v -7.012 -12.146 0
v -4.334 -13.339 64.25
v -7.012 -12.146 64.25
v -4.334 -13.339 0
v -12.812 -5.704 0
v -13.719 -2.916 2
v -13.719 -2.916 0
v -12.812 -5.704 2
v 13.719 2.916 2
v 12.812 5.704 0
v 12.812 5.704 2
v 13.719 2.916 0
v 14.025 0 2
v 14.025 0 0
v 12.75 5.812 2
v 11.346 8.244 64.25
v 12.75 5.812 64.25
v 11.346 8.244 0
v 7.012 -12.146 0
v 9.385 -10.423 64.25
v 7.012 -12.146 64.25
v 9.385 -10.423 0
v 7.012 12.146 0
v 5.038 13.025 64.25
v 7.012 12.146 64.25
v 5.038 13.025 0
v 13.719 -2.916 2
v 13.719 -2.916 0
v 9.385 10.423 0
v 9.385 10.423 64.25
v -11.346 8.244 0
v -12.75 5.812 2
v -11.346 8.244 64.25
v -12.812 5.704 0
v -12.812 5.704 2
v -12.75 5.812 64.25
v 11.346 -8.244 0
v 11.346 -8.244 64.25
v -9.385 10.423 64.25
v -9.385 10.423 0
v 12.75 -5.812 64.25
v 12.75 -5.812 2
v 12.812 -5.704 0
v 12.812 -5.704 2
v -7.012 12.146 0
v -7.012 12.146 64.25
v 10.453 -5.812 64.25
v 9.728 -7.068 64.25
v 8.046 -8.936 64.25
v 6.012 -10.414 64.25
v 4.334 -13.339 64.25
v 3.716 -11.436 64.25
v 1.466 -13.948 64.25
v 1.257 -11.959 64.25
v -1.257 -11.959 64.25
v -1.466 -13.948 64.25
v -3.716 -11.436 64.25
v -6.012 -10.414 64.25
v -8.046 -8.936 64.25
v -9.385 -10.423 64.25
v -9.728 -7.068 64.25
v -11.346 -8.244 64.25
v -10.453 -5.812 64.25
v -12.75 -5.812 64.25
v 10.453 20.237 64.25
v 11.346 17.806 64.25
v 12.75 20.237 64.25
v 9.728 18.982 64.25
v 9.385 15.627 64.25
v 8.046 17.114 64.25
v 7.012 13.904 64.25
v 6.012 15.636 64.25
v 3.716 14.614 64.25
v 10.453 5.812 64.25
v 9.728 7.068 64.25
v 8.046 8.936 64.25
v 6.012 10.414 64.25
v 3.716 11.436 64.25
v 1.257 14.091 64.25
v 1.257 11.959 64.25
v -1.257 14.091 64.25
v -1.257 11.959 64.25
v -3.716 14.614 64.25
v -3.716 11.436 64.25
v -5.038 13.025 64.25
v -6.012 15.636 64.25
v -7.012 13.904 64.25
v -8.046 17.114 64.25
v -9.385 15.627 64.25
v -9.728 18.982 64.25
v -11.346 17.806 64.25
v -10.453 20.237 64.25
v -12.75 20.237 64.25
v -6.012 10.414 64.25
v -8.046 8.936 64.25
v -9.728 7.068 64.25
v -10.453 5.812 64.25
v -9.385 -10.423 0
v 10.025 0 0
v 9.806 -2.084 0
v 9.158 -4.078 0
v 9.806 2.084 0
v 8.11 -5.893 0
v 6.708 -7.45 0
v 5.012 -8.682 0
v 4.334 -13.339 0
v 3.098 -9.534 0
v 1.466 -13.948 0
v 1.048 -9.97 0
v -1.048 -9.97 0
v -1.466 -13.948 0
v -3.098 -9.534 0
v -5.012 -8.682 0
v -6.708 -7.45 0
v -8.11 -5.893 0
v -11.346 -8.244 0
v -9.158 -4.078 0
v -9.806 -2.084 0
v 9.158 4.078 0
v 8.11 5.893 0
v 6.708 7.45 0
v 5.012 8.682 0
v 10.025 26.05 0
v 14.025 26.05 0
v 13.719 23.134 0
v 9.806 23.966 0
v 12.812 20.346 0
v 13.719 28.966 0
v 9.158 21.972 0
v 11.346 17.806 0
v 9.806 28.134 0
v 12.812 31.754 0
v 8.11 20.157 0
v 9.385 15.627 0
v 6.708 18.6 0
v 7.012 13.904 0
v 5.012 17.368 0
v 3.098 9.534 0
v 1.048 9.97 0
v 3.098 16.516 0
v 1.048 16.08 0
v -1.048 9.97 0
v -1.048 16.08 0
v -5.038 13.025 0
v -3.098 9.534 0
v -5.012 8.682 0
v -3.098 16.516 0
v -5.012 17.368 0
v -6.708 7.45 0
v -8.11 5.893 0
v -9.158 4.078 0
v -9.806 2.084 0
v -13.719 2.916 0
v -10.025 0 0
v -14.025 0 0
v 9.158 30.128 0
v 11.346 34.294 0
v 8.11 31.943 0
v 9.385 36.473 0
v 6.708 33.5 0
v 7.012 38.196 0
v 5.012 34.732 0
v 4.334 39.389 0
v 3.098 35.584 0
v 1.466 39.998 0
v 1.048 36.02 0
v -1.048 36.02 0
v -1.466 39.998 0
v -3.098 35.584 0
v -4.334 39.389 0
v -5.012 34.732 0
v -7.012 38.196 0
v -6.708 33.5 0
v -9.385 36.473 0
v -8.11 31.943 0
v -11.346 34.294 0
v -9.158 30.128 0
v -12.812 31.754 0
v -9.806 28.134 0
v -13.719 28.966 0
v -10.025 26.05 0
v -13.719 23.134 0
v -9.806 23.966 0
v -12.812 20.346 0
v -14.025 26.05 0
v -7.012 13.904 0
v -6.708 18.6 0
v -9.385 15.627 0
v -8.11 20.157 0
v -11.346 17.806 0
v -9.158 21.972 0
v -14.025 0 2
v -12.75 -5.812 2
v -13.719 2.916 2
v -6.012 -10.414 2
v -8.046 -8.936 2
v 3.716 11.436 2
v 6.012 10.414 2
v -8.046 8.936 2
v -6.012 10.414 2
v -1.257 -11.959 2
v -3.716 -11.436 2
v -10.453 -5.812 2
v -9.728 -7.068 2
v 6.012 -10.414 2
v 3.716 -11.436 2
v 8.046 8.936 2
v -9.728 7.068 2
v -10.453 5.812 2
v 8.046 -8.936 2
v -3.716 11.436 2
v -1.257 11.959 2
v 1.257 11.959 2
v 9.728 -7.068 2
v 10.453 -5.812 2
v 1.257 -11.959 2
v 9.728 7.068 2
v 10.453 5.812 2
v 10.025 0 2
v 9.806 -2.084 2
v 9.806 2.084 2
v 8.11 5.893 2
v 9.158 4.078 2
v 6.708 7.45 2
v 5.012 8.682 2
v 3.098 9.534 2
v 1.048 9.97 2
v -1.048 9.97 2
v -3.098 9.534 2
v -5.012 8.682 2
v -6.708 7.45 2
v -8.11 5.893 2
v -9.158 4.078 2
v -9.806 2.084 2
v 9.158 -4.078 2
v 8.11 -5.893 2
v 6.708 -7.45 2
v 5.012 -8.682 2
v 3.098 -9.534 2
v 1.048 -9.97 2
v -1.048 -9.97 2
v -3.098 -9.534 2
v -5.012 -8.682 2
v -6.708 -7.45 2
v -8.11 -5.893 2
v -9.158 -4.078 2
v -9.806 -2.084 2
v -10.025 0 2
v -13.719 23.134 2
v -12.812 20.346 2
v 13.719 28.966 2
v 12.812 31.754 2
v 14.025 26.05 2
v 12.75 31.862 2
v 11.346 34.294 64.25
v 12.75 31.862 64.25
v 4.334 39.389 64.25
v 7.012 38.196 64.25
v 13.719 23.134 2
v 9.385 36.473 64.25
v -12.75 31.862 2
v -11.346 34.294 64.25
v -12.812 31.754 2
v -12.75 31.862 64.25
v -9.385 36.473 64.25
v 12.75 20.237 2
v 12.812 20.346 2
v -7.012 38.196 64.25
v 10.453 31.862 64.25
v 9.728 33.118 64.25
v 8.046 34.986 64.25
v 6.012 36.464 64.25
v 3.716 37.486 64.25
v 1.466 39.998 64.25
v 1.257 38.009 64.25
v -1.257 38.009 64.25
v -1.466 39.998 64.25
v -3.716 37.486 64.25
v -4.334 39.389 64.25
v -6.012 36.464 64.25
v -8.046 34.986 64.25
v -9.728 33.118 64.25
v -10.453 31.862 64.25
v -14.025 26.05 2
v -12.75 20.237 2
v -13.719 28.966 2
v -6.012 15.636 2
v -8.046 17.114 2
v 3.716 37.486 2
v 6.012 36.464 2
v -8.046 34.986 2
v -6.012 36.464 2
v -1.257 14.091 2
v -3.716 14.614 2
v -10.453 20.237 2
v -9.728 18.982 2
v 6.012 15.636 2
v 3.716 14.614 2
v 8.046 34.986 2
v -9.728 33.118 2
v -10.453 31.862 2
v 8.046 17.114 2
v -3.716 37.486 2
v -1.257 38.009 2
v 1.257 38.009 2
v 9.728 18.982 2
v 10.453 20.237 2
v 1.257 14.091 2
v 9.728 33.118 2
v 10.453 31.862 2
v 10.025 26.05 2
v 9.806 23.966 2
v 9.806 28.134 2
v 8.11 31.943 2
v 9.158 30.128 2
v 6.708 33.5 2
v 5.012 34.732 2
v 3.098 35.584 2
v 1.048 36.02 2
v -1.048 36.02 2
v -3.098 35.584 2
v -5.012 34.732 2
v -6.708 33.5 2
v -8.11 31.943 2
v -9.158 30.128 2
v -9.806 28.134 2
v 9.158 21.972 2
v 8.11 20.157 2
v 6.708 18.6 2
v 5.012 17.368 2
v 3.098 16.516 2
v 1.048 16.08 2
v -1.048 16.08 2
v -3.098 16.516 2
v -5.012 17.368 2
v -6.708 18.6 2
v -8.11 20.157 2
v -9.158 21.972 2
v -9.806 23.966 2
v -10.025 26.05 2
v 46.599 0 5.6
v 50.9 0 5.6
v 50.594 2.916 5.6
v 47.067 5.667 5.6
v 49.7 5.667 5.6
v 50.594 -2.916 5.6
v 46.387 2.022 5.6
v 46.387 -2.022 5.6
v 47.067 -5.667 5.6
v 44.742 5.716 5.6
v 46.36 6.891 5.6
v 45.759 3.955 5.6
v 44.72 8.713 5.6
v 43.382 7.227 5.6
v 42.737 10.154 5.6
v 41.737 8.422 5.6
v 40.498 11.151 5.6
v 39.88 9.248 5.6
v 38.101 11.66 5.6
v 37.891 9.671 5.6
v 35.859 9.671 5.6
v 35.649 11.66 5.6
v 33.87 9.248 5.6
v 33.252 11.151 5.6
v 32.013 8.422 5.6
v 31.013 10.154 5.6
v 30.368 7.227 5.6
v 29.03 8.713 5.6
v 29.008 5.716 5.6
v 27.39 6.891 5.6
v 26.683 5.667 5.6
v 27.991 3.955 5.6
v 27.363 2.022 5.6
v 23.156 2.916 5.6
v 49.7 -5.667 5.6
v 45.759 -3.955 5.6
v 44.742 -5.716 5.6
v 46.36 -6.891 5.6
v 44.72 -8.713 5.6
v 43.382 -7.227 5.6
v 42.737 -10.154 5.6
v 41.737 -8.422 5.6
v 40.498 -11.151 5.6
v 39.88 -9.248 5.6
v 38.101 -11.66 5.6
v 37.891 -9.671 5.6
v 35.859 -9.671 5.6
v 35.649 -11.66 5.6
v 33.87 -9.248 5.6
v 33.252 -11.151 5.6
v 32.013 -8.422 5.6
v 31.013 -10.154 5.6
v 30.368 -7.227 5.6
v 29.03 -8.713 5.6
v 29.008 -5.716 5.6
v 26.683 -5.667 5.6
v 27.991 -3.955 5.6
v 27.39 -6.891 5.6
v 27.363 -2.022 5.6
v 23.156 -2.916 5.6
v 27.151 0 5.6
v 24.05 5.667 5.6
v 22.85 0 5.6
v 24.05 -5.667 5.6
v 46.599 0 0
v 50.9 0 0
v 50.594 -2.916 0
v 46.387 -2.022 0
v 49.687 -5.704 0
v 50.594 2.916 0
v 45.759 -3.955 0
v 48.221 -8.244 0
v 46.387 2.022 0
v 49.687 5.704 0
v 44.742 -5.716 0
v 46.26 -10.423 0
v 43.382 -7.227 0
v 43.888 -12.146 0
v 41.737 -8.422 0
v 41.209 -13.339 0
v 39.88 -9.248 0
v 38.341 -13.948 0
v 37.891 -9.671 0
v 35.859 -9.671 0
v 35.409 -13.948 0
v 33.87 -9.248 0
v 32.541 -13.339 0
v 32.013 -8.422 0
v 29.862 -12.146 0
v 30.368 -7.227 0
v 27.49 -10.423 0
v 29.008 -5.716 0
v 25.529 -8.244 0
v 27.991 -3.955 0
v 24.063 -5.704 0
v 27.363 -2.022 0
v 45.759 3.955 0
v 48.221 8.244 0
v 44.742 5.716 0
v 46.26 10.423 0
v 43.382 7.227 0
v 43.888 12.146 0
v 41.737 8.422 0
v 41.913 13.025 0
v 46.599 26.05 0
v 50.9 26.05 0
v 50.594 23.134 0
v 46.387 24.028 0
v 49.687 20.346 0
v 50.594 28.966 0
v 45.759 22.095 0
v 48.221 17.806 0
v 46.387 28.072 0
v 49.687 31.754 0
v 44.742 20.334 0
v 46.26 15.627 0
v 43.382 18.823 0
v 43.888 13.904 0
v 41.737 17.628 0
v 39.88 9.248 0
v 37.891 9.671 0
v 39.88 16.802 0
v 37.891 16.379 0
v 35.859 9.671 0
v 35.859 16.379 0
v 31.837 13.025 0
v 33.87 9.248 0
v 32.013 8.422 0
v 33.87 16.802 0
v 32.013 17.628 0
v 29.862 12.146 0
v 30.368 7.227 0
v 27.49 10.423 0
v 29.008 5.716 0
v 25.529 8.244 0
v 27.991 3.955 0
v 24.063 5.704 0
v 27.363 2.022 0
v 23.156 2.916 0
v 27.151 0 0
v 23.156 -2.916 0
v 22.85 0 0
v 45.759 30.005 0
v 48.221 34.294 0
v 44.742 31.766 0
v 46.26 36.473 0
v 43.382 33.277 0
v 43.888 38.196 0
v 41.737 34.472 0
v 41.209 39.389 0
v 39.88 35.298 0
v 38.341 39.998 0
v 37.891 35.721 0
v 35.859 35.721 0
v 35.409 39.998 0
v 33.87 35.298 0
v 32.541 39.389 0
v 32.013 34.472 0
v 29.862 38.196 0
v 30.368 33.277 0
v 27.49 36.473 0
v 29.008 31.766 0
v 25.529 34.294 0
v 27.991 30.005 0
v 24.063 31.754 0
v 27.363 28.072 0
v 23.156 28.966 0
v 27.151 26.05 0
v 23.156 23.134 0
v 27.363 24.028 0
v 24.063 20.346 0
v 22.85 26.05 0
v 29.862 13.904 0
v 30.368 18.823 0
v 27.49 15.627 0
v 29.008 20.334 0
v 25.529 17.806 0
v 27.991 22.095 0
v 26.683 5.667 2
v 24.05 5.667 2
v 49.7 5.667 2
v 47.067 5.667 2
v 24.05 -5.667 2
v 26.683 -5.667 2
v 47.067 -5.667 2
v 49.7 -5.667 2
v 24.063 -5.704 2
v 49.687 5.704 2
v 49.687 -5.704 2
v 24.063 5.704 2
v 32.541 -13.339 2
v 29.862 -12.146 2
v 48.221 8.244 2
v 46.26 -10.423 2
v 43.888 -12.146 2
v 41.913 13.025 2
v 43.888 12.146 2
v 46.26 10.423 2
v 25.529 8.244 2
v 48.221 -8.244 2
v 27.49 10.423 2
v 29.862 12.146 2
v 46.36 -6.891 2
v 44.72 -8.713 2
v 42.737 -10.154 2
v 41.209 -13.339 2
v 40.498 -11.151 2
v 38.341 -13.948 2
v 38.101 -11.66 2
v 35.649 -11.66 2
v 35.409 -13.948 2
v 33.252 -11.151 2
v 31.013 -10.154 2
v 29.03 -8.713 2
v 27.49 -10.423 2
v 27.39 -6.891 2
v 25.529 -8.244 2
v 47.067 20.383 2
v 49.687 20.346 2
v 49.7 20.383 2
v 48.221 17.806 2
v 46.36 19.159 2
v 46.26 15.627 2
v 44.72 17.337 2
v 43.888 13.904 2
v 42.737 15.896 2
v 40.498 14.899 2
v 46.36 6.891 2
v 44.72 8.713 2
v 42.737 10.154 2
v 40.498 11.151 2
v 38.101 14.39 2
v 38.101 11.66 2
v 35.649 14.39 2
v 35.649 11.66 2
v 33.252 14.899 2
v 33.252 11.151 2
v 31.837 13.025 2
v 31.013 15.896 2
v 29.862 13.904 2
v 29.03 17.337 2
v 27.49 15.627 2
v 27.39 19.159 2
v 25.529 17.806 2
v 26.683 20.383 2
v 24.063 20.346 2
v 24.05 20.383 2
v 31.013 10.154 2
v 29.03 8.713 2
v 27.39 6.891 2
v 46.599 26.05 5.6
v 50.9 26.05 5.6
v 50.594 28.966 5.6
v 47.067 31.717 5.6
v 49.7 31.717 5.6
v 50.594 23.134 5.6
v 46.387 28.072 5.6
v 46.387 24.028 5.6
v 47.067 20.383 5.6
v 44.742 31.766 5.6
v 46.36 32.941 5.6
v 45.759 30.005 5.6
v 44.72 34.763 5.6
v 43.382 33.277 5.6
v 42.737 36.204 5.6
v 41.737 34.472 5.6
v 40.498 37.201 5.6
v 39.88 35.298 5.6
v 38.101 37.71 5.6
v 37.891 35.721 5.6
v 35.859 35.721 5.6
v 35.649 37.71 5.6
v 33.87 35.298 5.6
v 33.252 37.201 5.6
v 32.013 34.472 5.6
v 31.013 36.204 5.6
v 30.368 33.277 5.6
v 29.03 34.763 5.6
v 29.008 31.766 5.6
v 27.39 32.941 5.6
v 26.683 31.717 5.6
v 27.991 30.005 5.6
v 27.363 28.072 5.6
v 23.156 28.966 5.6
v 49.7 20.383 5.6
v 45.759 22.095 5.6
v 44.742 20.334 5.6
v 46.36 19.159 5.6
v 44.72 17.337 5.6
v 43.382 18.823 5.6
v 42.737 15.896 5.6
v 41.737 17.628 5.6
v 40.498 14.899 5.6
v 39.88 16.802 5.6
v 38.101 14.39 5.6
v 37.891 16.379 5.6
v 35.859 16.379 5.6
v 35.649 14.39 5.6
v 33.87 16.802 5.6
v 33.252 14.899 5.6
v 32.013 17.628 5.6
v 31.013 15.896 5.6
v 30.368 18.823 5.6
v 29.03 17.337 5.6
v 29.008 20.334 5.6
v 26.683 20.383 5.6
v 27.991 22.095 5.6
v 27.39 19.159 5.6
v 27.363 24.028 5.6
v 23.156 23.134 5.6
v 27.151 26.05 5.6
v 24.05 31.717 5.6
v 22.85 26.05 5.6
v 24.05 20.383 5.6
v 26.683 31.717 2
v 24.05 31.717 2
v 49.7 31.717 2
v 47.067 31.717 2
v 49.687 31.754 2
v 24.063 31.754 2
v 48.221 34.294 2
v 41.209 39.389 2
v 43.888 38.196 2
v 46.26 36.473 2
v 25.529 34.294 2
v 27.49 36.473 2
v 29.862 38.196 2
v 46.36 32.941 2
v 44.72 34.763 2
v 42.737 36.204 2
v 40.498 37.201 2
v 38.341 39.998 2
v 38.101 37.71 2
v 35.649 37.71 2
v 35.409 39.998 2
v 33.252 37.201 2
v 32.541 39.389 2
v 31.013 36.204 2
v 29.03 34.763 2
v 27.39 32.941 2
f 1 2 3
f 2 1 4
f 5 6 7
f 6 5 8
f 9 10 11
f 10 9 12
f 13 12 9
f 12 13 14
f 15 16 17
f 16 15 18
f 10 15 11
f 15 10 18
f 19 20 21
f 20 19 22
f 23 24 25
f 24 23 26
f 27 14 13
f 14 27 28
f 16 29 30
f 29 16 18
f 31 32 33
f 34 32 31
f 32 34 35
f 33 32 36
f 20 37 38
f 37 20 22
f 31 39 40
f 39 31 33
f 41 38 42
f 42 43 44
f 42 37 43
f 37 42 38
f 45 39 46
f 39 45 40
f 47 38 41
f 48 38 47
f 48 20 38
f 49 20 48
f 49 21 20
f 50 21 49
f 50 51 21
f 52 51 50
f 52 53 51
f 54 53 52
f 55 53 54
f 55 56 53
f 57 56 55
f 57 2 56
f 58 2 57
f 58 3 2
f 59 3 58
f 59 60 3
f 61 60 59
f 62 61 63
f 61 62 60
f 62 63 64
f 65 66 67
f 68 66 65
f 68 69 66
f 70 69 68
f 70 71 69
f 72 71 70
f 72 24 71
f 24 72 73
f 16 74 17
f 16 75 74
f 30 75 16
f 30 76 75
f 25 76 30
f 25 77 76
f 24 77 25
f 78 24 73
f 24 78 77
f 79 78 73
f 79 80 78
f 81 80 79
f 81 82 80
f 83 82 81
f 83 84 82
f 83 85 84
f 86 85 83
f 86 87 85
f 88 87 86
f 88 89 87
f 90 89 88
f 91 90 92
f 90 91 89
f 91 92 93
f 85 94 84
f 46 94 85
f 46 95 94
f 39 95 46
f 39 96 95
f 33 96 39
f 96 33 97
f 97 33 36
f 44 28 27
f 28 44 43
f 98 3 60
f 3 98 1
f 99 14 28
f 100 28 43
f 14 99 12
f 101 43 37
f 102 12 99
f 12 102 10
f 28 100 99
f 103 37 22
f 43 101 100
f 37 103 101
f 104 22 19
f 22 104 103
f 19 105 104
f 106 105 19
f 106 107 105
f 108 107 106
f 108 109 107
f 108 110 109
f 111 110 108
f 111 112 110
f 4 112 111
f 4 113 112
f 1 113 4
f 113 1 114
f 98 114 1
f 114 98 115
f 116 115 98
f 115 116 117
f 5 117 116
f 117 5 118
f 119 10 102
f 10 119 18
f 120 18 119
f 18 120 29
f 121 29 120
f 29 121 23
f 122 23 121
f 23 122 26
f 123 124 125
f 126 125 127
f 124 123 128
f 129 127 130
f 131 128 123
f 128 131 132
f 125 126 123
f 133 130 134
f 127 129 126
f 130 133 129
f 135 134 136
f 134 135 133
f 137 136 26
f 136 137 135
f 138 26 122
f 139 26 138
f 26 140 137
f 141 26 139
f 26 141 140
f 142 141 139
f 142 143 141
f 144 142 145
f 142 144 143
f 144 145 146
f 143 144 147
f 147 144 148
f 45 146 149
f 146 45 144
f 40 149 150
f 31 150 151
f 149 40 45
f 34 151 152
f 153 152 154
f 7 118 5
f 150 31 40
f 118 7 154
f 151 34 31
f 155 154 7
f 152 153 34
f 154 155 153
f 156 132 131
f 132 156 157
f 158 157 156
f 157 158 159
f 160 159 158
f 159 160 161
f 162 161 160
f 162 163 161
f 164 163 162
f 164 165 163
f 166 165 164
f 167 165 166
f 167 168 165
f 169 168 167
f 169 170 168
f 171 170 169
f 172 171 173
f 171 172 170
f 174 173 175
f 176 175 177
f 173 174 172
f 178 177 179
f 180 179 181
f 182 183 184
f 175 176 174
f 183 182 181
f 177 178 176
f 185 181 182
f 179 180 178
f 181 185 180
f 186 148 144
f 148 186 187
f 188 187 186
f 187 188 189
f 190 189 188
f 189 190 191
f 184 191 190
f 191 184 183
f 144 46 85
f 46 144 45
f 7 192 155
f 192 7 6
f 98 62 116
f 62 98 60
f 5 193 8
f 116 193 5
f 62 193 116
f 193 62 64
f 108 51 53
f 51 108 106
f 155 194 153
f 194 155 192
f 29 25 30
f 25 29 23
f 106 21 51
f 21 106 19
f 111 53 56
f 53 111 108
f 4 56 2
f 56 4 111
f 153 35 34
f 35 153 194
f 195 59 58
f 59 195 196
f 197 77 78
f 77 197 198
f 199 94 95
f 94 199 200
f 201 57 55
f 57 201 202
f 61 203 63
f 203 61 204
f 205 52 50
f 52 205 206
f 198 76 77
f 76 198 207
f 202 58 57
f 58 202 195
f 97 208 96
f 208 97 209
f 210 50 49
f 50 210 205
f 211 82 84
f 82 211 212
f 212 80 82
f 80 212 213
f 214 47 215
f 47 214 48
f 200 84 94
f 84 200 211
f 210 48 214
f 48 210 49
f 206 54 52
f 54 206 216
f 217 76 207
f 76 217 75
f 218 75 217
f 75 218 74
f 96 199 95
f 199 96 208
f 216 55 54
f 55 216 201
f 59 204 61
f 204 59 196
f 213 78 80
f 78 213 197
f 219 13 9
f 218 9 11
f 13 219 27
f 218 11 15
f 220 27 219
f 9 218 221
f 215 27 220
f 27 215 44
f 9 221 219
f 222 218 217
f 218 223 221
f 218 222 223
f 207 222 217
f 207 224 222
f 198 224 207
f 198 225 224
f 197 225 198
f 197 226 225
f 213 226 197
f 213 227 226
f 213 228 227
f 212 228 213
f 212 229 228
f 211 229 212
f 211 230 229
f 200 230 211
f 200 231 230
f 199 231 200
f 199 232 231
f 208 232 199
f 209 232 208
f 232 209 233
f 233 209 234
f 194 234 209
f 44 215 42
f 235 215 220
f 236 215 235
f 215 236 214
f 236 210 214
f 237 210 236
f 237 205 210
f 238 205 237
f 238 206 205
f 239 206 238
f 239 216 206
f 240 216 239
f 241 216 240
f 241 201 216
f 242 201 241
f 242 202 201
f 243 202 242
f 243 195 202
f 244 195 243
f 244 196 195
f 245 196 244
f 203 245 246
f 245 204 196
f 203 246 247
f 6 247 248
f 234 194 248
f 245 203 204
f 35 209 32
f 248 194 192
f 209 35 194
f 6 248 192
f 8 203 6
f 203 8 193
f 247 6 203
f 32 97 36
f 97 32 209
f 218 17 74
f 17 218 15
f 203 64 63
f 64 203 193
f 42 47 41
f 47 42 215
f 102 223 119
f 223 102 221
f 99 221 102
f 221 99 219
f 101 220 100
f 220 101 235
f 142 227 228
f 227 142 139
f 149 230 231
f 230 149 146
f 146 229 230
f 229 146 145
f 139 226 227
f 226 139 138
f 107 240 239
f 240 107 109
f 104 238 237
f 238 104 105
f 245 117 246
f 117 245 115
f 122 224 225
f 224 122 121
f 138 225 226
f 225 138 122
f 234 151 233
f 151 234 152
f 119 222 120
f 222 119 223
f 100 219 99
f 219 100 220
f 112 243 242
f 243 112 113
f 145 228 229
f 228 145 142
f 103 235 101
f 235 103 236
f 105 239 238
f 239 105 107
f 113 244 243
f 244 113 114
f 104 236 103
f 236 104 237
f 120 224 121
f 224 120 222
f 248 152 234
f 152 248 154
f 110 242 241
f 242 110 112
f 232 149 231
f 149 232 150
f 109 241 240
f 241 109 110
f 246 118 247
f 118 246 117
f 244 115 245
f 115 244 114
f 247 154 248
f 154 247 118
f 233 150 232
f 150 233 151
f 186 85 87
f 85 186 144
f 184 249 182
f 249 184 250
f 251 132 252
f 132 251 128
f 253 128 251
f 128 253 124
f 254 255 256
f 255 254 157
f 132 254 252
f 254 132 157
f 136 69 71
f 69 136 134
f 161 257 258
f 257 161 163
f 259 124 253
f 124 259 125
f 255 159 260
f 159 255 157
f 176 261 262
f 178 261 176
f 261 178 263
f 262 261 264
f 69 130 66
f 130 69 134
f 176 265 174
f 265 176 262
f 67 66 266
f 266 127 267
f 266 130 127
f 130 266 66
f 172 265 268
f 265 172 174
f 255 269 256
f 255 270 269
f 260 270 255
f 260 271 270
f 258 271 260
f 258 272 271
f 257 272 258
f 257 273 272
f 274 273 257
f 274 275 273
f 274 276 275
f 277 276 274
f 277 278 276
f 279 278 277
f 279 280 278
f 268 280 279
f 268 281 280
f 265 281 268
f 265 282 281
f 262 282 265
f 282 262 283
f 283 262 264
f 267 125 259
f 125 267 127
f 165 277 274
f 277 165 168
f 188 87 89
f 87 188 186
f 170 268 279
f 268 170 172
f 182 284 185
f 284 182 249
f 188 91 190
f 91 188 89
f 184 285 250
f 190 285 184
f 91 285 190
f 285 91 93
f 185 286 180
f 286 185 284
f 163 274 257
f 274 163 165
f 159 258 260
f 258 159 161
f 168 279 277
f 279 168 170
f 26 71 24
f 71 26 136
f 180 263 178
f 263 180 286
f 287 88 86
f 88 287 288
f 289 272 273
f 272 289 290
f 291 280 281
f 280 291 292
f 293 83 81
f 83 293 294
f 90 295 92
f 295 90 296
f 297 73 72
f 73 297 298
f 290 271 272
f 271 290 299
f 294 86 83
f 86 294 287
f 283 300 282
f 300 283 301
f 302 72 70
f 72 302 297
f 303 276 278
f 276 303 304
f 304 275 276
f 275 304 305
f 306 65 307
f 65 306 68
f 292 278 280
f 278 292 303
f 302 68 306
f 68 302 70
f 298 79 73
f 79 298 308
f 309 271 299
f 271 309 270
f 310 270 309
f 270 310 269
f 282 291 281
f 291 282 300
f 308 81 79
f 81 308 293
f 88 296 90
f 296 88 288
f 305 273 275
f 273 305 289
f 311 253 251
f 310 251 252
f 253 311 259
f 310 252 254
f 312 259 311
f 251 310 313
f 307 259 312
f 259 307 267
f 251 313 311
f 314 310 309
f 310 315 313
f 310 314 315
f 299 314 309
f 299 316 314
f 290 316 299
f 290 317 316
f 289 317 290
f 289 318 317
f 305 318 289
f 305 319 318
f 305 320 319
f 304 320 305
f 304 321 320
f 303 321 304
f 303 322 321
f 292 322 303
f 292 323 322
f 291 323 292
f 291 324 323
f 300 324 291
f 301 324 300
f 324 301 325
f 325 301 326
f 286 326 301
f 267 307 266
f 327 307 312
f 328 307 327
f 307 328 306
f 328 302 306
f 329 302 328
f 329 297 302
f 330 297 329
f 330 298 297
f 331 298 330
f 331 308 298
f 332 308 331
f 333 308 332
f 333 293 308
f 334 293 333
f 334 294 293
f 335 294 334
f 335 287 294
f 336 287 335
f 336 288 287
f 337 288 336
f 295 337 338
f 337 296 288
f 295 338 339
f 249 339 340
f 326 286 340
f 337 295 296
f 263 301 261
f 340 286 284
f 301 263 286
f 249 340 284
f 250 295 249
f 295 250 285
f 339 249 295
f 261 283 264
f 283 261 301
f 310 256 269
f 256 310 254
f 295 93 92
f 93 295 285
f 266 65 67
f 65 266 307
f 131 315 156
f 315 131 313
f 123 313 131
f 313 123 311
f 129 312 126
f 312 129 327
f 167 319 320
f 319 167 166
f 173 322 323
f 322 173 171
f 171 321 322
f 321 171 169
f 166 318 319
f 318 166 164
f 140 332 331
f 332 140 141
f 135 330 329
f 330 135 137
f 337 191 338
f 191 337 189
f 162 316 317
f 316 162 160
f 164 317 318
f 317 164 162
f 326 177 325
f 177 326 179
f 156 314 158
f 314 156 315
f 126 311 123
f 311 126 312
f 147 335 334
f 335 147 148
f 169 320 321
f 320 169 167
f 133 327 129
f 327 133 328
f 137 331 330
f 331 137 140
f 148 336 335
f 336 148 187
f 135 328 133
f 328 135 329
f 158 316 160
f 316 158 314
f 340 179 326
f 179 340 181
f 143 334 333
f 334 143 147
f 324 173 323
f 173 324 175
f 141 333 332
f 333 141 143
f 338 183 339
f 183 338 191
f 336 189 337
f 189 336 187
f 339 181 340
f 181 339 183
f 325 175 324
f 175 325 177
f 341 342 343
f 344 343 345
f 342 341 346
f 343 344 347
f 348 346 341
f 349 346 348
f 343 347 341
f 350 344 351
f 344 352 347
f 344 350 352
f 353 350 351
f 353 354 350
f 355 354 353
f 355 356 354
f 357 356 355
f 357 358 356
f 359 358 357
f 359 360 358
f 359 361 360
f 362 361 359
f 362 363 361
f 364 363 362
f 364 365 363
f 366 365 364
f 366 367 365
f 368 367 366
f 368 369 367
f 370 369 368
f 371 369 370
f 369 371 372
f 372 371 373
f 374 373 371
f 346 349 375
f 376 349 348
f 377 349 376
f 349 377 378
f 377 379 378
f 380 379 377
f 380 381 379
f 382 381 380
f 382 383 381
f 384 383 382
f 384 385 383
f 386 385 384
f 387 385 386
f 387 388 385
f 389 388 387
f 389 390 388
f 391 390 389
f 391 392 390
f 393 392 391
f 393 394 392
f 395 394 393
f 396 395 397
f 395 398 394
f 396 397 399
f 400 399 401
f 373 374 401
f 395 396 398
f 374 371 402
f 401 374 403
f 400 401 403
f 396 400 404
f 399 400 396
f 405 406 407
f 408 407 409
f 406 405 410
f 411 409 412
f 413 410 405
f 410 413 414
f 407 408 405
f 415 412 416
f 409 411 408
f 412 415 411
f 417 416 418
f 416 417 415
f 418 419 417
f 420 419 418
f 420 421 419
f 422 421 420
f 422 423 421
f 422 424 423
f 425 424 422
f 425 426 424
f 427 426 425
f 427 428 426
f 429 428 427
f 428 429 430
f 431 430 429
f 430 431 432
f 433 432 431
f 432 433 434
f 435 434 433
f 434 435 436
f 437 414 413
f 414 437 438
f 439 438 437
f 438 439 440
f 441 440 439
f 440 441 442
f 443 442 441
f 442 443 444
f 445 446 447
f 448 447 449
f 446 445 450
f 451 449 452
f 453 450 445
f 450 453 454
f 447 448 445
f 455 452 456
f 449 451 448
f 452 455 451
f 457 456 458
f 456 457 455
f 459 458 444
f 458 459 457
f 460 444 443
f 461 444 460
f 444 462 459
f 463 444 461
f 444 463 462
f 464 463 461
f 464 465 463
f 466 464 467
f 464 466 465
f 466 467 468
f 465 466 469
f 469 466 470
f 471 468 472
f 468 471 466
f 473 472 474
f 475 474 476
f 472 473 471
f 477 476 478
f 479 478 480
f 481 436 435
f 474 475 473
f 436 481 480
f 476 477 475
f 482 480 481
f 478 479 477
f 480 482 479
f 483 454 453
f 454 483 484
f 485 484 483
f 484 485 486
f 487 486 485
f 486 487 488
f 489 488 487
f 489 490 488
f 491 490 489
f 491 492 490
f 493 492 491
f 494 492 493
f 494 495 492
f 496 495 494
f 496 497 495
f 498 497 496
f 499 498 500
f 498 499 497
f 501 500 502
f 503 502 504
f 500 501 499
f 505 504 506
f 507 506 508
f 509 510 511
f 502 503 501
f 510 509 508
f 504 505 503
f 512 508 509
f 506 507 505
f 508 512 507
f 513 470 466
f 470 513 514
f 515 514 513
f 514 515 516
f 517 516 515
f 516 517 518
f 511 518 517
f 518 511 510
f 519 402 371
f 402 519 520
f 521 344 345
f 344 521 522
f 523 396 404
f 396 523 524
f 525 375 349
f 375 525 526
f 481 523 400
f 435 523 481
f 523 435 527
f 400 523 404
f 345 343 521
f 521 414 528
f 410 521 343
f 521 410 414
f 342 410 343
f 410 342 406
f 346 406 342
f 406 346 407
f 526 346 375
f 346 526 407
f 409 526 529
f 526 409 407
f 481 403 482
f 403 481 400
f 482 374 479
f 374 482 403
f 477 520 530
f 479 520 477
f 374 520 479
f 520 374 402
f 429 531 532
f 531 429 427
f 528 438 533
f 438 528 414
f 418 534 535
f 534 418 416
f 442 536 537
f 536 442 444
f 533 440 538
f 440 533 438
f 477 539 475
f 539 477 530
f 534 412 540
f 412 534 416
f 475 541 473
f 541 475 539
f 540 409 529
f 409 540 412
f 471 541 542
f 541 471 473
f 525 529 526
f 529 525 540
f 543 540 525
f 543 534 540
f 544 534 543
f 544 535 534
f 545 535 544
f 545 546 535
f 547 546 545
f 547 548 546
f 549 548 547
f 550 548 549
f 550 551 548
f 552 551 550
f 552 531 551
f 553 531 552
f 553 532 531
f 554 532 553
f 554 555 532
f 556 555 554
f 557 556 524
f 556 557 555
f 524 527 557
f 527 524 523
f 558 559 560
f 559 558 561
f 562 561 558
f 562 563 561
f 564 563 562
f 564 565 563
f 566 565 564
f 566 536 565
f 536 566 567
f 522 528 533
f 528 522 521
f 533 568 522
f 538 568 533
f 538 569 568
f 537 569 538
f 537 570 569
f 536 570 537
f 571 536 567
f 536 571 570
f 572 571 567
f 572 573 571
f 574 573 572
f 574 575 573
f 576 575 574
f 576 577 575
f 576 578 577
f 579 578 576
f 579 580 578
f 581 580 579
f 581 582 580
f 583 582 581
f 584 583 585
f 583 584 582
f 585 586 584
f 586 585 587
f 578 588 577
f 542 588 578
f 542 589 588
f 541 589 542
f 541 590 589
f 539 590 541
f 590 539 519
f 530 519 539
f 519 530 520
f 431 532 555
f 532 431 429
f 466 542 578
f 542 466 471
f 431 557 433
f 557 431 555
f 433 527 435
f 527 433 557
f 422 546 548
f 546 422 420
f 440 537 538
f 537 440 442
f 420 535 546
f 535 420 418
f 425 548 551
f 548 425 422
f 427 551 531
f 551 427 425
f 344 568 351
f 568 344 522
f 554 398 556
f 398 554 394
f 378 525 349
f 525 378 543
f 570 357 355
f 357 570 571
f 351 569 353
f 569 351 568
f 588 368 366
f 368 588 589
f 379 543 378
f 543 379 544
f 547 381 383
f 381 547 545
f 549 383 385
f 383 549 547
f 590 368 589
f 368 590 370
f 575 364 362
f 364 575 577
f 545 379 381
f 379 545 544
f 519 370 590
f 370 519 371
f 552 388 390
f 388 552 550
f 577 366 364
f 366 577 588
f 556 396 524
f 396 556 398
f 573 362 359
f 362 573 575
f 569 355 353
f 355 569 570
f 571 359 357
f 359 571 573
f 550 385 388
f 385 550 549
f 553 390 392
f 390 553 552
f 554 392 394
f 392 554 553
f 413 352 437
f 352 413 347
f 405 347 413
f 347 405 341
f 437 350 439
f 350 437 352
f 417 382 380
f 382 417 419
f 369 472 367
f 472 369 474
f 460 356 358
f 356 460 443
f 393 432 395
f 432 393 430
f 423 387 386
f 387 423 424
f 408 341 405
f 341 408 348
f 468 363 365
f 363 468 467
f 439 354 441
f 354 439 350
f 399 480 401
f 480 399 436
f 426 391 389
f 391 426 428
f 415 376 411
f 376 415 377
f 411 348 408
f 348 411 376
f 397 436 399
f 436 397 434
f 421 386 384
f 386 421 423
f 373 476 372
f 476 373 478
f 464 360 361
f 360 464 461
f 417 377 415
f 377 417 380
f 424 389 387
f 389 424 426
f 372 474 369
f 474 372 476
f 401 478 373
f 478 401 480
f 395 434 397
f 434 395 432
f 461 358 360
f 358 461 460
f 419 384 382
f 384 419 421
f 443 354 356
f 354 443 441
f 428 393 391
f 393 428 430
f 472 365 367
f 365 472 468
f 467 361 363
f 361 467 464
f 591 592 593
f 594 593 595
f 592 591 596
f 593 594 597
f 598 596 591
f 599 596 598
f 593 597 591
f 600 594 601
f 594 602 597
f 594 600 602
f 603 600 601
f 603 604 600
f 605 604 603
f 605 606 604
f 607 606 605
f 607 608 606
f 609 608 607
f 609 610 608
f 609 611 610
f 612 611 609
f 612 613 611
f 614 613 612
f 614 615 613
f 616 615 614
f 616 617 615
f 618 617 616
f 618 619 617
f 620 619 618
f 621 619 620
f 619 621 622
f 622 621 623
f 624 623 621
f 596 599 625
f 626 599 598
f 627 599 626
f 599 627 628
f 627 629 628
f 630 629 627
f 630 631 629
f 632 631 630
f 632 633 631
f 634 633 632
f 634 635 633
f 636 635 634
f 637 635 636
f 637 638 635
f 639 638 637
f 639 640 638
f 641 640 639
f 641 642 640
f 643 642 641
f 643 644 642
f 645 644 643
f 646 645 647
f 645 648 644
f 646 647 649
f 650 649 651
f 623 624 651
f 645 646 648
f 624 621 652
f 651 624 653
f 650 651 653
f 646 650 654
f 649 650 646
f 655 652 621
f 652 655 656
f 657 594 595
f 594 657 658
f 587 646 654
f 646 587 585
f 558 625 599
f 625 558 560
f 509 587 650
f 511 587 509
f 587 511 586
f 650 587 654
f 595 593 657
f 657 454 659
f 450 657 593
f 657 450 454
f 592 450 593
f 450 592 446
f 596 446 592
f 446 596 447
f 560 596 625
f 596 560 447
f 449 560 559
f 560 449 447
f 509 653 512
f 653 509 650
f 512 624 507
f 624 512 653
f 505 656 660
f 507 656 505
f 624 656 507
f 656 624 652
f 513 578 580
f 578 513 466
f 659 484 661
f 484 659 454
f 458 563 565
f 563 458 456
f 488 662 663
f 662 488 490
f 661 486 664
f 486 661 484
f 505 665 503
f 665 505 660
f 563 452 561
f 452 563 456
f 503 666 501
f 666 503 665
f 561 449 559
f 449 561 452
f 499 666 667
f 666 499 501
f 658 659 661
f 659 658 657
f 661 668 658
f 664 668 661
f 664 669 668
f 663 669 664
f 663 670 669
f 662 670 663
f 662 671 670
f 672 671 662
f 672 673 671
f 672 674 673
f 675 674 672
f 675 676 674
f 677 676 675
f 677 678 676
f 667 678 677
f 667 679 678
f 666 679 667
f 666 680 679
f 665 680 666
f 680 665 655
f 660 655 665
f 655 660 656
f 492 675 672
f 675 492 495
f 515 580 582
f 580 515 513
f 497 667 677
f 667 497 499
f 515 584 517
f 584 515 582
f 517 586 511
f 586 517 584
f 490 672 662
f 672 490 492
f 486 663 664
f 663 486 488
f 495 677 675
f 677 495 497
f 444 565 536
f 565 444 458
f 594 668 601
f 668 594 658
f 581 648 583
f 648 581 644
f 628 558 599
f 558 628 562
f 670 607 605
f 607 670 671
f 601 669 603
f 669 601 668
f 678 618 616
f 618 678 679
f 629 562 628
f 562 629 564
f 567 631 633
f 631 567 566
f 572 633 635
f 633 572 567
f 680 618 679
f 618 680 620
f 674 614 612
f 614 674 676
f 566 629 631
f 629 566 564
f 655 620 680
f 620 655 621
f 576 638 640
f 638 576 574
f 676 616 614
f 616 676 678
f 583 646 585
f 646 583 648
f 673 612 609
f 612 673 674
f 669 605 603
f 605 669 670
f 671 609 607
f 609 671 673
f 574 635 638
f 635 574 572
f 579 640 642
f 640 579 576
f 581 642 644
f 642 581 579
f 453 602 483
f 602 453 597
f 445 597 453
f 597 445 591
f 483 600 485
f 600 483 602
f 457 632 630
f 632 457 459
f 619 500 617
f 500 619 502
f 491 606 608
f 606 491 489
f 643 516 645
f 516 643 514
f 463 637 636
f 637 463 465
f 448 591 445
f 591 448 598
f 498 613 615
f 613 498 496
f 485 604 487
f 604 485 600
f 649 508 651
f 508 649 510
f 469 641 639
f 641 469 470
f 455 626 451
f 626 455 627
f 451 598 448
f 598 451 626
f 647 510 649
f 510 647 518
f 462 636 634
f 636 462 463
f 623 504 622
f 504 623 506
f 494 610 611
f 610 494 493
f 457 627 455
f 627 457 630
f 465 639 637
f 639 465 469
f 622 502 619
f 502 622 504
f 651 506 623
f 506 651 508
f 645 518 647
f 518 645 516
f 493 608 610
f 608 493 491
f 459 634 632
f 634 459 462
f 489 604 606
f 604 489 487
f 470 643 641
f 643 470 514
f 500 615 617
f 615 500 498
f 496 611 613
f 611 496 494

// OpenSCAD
/*
 * PARAMETRIC COIN TUBES + CAP
 * VERSION 1.3.1
 * last update: 02/12/13
 * design by newq 
 * mod kitwallace (thanks!)
 */

// 
// the generated tubes insides are 2 coins higher than the number of coins they fit

coin_type = 0; // [ 0:1 Euro, 1:2 Euro, 2:50 Euro cents,  3:20 Euro cents, 4:10 Euro cents, 5:5 Euro cents, 6:2 Euro cent, 7: 1 Euro cent, 8: 1 US Dollar, 9: 0.50 US Dollar, 10: 0.25 US Dollar, 11: 0.10 US Dollar, 12: 0.05 US Dollar, 13: 0.01 US Dollar, 14: 2 Canadian Dollar, 15: 1 Canadian Dollar, 16: 0.50 Canadian Dollar, 17: 0.25 Canadian Dollar, 18: 0.10 Canadian Dollar, 19: 0.05 Canadian Dollar, 20: 0.01 Canadian Dollar, 21: 0.50 Mexican Pesos, 22: 1 Mexican Pesos, 23: 2 Mexican Pesos, 24: 5 Mexican Pesos, 25: 10 Mexican Pesos, 26: 20 Mexican Pesos, 27: 100 Mexican Pesos]

// how many stacked coins should fit in a tube
number_of_coins = 25; 
number_of_tubes = 2; 

// Do you want to print the tubes?
generate_tube = 1; // [1:Yes, 0:No] 
// Do you want a cap to close the tube?
generate_cap = 1; // [1:Yes, 0:No] 
// thickness of wall and bottom (mm)
tube_wall = 2;  
// clearance from coin to wall of tube (mm) 
clearance = 0.4;
// if the cap fits too tight you might decrease slightly
fudge_factor = 0.975; 

// NOTHING TO SEE HERE :)

// coin data - name, diameter, height
coins = [ 
              ["1 Euro", 23.25, 2.33], 
              ["2 Euro", 25.75, 2.20],
              ["50 Euro cents", 24.25, 2.38],
              ["20 Euro cents", 22.25, 2.14],
              ["10 Euro cents", 19.75, 1.93],
              ["5 Euro cents", 21.25, 1.67],
              ["2 Euro cents", 18.75, 1.67],
              ["1 Euro cents", 16.25, 1.67],
              ["1 US Dollar", 26.50, 2.00],
              ["0.50 US Dollar", 30.61, 2.15],
              ["0.25 US Dollar", 24.26, 1.75],
              ["0.10 US Dollar", 17.91, 1.35],
              ["0.05 US Dollar", 21.21, 1.95],
              ["0.01 US Dollar", 19.05, 1.55],
              ["2 Canadian Dollar", 28.00, 1.80],
              ["1 Canadian Dollar", 26.50, 1.75],
              ["0.50 Canadian Dollar", 27.13, 1.95],
              ["0.25 Canadian Dollar", 23.88, 1.58],
              ["0.10 Canadian Dollar", 18.03, 1.22],
              ["0.05 Canadian Dollar", 21.2, 1.76],
              ["0.01 Canadian Dollar", 19.05, 1.45],
				  ["0.50 Mexican Pesos", 17.00, 2.10],
				  ["1 Mexican Pesos", 21.13, 1.75],
				  ["2 Mexican Pesos", 23.08, 1.75],
				  ["5 Mexican Pesos", 25.53, 2.03],
				  ["10 Mexican Pesos", 28.00, 2.25],
				  ["20 Mexican Pesos", 32.00, 2.60],
				  ["100 Mexican Pesos", 39.09, 3.65],
            ];

coin_diameter = coins[coin_type][1];
coin_height = coins[coin_type][2];

// generating the tubes
if (generate_tube) {
  assign(cyl_inner_h = (coin_height * number_of_coins) + (4 * tube_wall),
             cyl_inner_r = (coin_diameter / 2) + clearance,

             cyl_outer_h = (coin_height * number_of_coins) + (3 * tube_wall),
             cyl_outer_r = (coin_diameter / 2) + tube_wall + clearance,

             cutout_x = coin_diameter + (4 * tube_wall),
             cutout_y = (coin_diameter / 2),
             cutout_z = (coin_height * number_of_coins) + (3 * tube_wall)
             )


  for (z = [0 : (number_of_tubes-1)]){

	translate (v = [0, z * (cyl_outer_r * 2 - tube_wall), 0]){
		difference(){	
			difference(){
				difference() {
					// outer tube
					cylinder(h = cyl_outer_h, r = cyl_outer_r);
					// inner tube
					translate(v = [0, 0, tube_wall]) {
						cylinder(h = cyl_inner_h, r = cyl_inner_r);
					}
				}
				// round bottom cutout
				translate (v = [0, 0, ((cutout_z / 2) + tube_wall)]){
					cube(size = [cutout_x, cutout_y, cutout_z], center = true);
				}
			}
			// cutout
			translate (v = [0, 0, -tube_wall]){
				cylinder(h = (cyl_inner_h + tube_wall), r = (cyl_inner_r - tube_wall));
			}
		}
   }
}

}

// generating the tube tops

if (generate_cap) {
   assign (cyl_inner_h = 3*tube_wall - clearance,
               cyl_inner_r = ((coin_diameter / 2) + clearance) * fudge_factor,

               cyl_outer_h = tube_wall,
               cyl_outer_r = (coin_diameter / 2) + tube_wall + clearance,

               cutout_x = coin_diameter + (4 * tube_wall),
               cutout_y = (coin_diameter / 2) * fudge_factor,
               cutout_z = 3*tube_wall - clearance
             )
    translate([1.5 * coin_diameter + tube_wall, 0, 0]){
	for (z = [0 : (number_of_tubes-1)]){
		
		translate (v = [0, z * (cyl_outer_r * 2 - tube_wall), 0]){
			difference(){
				union(){		
					cylinder(h = cyl_outer_h, r = cyl_outer_r);
					cylinder(h = cyl_inner_h, r = cyl_inner_r);
				
					intersection(){
						translate([0,0,cutout_z/2]){
							cube(size = [cutout_x, cutout_y, cutout_z], center = true);
						}
						cylinder(h = cyl_outer_h+10, r = cyl_outer_r);
					}
				}
				
				translate([0,0,-(cyl_inner_h /2)]){
					cylinder(h = cyl_inner_h *2, r = cyl_inner_r - tube_wall);
				}			
			}		
		}
	}	
}
}
